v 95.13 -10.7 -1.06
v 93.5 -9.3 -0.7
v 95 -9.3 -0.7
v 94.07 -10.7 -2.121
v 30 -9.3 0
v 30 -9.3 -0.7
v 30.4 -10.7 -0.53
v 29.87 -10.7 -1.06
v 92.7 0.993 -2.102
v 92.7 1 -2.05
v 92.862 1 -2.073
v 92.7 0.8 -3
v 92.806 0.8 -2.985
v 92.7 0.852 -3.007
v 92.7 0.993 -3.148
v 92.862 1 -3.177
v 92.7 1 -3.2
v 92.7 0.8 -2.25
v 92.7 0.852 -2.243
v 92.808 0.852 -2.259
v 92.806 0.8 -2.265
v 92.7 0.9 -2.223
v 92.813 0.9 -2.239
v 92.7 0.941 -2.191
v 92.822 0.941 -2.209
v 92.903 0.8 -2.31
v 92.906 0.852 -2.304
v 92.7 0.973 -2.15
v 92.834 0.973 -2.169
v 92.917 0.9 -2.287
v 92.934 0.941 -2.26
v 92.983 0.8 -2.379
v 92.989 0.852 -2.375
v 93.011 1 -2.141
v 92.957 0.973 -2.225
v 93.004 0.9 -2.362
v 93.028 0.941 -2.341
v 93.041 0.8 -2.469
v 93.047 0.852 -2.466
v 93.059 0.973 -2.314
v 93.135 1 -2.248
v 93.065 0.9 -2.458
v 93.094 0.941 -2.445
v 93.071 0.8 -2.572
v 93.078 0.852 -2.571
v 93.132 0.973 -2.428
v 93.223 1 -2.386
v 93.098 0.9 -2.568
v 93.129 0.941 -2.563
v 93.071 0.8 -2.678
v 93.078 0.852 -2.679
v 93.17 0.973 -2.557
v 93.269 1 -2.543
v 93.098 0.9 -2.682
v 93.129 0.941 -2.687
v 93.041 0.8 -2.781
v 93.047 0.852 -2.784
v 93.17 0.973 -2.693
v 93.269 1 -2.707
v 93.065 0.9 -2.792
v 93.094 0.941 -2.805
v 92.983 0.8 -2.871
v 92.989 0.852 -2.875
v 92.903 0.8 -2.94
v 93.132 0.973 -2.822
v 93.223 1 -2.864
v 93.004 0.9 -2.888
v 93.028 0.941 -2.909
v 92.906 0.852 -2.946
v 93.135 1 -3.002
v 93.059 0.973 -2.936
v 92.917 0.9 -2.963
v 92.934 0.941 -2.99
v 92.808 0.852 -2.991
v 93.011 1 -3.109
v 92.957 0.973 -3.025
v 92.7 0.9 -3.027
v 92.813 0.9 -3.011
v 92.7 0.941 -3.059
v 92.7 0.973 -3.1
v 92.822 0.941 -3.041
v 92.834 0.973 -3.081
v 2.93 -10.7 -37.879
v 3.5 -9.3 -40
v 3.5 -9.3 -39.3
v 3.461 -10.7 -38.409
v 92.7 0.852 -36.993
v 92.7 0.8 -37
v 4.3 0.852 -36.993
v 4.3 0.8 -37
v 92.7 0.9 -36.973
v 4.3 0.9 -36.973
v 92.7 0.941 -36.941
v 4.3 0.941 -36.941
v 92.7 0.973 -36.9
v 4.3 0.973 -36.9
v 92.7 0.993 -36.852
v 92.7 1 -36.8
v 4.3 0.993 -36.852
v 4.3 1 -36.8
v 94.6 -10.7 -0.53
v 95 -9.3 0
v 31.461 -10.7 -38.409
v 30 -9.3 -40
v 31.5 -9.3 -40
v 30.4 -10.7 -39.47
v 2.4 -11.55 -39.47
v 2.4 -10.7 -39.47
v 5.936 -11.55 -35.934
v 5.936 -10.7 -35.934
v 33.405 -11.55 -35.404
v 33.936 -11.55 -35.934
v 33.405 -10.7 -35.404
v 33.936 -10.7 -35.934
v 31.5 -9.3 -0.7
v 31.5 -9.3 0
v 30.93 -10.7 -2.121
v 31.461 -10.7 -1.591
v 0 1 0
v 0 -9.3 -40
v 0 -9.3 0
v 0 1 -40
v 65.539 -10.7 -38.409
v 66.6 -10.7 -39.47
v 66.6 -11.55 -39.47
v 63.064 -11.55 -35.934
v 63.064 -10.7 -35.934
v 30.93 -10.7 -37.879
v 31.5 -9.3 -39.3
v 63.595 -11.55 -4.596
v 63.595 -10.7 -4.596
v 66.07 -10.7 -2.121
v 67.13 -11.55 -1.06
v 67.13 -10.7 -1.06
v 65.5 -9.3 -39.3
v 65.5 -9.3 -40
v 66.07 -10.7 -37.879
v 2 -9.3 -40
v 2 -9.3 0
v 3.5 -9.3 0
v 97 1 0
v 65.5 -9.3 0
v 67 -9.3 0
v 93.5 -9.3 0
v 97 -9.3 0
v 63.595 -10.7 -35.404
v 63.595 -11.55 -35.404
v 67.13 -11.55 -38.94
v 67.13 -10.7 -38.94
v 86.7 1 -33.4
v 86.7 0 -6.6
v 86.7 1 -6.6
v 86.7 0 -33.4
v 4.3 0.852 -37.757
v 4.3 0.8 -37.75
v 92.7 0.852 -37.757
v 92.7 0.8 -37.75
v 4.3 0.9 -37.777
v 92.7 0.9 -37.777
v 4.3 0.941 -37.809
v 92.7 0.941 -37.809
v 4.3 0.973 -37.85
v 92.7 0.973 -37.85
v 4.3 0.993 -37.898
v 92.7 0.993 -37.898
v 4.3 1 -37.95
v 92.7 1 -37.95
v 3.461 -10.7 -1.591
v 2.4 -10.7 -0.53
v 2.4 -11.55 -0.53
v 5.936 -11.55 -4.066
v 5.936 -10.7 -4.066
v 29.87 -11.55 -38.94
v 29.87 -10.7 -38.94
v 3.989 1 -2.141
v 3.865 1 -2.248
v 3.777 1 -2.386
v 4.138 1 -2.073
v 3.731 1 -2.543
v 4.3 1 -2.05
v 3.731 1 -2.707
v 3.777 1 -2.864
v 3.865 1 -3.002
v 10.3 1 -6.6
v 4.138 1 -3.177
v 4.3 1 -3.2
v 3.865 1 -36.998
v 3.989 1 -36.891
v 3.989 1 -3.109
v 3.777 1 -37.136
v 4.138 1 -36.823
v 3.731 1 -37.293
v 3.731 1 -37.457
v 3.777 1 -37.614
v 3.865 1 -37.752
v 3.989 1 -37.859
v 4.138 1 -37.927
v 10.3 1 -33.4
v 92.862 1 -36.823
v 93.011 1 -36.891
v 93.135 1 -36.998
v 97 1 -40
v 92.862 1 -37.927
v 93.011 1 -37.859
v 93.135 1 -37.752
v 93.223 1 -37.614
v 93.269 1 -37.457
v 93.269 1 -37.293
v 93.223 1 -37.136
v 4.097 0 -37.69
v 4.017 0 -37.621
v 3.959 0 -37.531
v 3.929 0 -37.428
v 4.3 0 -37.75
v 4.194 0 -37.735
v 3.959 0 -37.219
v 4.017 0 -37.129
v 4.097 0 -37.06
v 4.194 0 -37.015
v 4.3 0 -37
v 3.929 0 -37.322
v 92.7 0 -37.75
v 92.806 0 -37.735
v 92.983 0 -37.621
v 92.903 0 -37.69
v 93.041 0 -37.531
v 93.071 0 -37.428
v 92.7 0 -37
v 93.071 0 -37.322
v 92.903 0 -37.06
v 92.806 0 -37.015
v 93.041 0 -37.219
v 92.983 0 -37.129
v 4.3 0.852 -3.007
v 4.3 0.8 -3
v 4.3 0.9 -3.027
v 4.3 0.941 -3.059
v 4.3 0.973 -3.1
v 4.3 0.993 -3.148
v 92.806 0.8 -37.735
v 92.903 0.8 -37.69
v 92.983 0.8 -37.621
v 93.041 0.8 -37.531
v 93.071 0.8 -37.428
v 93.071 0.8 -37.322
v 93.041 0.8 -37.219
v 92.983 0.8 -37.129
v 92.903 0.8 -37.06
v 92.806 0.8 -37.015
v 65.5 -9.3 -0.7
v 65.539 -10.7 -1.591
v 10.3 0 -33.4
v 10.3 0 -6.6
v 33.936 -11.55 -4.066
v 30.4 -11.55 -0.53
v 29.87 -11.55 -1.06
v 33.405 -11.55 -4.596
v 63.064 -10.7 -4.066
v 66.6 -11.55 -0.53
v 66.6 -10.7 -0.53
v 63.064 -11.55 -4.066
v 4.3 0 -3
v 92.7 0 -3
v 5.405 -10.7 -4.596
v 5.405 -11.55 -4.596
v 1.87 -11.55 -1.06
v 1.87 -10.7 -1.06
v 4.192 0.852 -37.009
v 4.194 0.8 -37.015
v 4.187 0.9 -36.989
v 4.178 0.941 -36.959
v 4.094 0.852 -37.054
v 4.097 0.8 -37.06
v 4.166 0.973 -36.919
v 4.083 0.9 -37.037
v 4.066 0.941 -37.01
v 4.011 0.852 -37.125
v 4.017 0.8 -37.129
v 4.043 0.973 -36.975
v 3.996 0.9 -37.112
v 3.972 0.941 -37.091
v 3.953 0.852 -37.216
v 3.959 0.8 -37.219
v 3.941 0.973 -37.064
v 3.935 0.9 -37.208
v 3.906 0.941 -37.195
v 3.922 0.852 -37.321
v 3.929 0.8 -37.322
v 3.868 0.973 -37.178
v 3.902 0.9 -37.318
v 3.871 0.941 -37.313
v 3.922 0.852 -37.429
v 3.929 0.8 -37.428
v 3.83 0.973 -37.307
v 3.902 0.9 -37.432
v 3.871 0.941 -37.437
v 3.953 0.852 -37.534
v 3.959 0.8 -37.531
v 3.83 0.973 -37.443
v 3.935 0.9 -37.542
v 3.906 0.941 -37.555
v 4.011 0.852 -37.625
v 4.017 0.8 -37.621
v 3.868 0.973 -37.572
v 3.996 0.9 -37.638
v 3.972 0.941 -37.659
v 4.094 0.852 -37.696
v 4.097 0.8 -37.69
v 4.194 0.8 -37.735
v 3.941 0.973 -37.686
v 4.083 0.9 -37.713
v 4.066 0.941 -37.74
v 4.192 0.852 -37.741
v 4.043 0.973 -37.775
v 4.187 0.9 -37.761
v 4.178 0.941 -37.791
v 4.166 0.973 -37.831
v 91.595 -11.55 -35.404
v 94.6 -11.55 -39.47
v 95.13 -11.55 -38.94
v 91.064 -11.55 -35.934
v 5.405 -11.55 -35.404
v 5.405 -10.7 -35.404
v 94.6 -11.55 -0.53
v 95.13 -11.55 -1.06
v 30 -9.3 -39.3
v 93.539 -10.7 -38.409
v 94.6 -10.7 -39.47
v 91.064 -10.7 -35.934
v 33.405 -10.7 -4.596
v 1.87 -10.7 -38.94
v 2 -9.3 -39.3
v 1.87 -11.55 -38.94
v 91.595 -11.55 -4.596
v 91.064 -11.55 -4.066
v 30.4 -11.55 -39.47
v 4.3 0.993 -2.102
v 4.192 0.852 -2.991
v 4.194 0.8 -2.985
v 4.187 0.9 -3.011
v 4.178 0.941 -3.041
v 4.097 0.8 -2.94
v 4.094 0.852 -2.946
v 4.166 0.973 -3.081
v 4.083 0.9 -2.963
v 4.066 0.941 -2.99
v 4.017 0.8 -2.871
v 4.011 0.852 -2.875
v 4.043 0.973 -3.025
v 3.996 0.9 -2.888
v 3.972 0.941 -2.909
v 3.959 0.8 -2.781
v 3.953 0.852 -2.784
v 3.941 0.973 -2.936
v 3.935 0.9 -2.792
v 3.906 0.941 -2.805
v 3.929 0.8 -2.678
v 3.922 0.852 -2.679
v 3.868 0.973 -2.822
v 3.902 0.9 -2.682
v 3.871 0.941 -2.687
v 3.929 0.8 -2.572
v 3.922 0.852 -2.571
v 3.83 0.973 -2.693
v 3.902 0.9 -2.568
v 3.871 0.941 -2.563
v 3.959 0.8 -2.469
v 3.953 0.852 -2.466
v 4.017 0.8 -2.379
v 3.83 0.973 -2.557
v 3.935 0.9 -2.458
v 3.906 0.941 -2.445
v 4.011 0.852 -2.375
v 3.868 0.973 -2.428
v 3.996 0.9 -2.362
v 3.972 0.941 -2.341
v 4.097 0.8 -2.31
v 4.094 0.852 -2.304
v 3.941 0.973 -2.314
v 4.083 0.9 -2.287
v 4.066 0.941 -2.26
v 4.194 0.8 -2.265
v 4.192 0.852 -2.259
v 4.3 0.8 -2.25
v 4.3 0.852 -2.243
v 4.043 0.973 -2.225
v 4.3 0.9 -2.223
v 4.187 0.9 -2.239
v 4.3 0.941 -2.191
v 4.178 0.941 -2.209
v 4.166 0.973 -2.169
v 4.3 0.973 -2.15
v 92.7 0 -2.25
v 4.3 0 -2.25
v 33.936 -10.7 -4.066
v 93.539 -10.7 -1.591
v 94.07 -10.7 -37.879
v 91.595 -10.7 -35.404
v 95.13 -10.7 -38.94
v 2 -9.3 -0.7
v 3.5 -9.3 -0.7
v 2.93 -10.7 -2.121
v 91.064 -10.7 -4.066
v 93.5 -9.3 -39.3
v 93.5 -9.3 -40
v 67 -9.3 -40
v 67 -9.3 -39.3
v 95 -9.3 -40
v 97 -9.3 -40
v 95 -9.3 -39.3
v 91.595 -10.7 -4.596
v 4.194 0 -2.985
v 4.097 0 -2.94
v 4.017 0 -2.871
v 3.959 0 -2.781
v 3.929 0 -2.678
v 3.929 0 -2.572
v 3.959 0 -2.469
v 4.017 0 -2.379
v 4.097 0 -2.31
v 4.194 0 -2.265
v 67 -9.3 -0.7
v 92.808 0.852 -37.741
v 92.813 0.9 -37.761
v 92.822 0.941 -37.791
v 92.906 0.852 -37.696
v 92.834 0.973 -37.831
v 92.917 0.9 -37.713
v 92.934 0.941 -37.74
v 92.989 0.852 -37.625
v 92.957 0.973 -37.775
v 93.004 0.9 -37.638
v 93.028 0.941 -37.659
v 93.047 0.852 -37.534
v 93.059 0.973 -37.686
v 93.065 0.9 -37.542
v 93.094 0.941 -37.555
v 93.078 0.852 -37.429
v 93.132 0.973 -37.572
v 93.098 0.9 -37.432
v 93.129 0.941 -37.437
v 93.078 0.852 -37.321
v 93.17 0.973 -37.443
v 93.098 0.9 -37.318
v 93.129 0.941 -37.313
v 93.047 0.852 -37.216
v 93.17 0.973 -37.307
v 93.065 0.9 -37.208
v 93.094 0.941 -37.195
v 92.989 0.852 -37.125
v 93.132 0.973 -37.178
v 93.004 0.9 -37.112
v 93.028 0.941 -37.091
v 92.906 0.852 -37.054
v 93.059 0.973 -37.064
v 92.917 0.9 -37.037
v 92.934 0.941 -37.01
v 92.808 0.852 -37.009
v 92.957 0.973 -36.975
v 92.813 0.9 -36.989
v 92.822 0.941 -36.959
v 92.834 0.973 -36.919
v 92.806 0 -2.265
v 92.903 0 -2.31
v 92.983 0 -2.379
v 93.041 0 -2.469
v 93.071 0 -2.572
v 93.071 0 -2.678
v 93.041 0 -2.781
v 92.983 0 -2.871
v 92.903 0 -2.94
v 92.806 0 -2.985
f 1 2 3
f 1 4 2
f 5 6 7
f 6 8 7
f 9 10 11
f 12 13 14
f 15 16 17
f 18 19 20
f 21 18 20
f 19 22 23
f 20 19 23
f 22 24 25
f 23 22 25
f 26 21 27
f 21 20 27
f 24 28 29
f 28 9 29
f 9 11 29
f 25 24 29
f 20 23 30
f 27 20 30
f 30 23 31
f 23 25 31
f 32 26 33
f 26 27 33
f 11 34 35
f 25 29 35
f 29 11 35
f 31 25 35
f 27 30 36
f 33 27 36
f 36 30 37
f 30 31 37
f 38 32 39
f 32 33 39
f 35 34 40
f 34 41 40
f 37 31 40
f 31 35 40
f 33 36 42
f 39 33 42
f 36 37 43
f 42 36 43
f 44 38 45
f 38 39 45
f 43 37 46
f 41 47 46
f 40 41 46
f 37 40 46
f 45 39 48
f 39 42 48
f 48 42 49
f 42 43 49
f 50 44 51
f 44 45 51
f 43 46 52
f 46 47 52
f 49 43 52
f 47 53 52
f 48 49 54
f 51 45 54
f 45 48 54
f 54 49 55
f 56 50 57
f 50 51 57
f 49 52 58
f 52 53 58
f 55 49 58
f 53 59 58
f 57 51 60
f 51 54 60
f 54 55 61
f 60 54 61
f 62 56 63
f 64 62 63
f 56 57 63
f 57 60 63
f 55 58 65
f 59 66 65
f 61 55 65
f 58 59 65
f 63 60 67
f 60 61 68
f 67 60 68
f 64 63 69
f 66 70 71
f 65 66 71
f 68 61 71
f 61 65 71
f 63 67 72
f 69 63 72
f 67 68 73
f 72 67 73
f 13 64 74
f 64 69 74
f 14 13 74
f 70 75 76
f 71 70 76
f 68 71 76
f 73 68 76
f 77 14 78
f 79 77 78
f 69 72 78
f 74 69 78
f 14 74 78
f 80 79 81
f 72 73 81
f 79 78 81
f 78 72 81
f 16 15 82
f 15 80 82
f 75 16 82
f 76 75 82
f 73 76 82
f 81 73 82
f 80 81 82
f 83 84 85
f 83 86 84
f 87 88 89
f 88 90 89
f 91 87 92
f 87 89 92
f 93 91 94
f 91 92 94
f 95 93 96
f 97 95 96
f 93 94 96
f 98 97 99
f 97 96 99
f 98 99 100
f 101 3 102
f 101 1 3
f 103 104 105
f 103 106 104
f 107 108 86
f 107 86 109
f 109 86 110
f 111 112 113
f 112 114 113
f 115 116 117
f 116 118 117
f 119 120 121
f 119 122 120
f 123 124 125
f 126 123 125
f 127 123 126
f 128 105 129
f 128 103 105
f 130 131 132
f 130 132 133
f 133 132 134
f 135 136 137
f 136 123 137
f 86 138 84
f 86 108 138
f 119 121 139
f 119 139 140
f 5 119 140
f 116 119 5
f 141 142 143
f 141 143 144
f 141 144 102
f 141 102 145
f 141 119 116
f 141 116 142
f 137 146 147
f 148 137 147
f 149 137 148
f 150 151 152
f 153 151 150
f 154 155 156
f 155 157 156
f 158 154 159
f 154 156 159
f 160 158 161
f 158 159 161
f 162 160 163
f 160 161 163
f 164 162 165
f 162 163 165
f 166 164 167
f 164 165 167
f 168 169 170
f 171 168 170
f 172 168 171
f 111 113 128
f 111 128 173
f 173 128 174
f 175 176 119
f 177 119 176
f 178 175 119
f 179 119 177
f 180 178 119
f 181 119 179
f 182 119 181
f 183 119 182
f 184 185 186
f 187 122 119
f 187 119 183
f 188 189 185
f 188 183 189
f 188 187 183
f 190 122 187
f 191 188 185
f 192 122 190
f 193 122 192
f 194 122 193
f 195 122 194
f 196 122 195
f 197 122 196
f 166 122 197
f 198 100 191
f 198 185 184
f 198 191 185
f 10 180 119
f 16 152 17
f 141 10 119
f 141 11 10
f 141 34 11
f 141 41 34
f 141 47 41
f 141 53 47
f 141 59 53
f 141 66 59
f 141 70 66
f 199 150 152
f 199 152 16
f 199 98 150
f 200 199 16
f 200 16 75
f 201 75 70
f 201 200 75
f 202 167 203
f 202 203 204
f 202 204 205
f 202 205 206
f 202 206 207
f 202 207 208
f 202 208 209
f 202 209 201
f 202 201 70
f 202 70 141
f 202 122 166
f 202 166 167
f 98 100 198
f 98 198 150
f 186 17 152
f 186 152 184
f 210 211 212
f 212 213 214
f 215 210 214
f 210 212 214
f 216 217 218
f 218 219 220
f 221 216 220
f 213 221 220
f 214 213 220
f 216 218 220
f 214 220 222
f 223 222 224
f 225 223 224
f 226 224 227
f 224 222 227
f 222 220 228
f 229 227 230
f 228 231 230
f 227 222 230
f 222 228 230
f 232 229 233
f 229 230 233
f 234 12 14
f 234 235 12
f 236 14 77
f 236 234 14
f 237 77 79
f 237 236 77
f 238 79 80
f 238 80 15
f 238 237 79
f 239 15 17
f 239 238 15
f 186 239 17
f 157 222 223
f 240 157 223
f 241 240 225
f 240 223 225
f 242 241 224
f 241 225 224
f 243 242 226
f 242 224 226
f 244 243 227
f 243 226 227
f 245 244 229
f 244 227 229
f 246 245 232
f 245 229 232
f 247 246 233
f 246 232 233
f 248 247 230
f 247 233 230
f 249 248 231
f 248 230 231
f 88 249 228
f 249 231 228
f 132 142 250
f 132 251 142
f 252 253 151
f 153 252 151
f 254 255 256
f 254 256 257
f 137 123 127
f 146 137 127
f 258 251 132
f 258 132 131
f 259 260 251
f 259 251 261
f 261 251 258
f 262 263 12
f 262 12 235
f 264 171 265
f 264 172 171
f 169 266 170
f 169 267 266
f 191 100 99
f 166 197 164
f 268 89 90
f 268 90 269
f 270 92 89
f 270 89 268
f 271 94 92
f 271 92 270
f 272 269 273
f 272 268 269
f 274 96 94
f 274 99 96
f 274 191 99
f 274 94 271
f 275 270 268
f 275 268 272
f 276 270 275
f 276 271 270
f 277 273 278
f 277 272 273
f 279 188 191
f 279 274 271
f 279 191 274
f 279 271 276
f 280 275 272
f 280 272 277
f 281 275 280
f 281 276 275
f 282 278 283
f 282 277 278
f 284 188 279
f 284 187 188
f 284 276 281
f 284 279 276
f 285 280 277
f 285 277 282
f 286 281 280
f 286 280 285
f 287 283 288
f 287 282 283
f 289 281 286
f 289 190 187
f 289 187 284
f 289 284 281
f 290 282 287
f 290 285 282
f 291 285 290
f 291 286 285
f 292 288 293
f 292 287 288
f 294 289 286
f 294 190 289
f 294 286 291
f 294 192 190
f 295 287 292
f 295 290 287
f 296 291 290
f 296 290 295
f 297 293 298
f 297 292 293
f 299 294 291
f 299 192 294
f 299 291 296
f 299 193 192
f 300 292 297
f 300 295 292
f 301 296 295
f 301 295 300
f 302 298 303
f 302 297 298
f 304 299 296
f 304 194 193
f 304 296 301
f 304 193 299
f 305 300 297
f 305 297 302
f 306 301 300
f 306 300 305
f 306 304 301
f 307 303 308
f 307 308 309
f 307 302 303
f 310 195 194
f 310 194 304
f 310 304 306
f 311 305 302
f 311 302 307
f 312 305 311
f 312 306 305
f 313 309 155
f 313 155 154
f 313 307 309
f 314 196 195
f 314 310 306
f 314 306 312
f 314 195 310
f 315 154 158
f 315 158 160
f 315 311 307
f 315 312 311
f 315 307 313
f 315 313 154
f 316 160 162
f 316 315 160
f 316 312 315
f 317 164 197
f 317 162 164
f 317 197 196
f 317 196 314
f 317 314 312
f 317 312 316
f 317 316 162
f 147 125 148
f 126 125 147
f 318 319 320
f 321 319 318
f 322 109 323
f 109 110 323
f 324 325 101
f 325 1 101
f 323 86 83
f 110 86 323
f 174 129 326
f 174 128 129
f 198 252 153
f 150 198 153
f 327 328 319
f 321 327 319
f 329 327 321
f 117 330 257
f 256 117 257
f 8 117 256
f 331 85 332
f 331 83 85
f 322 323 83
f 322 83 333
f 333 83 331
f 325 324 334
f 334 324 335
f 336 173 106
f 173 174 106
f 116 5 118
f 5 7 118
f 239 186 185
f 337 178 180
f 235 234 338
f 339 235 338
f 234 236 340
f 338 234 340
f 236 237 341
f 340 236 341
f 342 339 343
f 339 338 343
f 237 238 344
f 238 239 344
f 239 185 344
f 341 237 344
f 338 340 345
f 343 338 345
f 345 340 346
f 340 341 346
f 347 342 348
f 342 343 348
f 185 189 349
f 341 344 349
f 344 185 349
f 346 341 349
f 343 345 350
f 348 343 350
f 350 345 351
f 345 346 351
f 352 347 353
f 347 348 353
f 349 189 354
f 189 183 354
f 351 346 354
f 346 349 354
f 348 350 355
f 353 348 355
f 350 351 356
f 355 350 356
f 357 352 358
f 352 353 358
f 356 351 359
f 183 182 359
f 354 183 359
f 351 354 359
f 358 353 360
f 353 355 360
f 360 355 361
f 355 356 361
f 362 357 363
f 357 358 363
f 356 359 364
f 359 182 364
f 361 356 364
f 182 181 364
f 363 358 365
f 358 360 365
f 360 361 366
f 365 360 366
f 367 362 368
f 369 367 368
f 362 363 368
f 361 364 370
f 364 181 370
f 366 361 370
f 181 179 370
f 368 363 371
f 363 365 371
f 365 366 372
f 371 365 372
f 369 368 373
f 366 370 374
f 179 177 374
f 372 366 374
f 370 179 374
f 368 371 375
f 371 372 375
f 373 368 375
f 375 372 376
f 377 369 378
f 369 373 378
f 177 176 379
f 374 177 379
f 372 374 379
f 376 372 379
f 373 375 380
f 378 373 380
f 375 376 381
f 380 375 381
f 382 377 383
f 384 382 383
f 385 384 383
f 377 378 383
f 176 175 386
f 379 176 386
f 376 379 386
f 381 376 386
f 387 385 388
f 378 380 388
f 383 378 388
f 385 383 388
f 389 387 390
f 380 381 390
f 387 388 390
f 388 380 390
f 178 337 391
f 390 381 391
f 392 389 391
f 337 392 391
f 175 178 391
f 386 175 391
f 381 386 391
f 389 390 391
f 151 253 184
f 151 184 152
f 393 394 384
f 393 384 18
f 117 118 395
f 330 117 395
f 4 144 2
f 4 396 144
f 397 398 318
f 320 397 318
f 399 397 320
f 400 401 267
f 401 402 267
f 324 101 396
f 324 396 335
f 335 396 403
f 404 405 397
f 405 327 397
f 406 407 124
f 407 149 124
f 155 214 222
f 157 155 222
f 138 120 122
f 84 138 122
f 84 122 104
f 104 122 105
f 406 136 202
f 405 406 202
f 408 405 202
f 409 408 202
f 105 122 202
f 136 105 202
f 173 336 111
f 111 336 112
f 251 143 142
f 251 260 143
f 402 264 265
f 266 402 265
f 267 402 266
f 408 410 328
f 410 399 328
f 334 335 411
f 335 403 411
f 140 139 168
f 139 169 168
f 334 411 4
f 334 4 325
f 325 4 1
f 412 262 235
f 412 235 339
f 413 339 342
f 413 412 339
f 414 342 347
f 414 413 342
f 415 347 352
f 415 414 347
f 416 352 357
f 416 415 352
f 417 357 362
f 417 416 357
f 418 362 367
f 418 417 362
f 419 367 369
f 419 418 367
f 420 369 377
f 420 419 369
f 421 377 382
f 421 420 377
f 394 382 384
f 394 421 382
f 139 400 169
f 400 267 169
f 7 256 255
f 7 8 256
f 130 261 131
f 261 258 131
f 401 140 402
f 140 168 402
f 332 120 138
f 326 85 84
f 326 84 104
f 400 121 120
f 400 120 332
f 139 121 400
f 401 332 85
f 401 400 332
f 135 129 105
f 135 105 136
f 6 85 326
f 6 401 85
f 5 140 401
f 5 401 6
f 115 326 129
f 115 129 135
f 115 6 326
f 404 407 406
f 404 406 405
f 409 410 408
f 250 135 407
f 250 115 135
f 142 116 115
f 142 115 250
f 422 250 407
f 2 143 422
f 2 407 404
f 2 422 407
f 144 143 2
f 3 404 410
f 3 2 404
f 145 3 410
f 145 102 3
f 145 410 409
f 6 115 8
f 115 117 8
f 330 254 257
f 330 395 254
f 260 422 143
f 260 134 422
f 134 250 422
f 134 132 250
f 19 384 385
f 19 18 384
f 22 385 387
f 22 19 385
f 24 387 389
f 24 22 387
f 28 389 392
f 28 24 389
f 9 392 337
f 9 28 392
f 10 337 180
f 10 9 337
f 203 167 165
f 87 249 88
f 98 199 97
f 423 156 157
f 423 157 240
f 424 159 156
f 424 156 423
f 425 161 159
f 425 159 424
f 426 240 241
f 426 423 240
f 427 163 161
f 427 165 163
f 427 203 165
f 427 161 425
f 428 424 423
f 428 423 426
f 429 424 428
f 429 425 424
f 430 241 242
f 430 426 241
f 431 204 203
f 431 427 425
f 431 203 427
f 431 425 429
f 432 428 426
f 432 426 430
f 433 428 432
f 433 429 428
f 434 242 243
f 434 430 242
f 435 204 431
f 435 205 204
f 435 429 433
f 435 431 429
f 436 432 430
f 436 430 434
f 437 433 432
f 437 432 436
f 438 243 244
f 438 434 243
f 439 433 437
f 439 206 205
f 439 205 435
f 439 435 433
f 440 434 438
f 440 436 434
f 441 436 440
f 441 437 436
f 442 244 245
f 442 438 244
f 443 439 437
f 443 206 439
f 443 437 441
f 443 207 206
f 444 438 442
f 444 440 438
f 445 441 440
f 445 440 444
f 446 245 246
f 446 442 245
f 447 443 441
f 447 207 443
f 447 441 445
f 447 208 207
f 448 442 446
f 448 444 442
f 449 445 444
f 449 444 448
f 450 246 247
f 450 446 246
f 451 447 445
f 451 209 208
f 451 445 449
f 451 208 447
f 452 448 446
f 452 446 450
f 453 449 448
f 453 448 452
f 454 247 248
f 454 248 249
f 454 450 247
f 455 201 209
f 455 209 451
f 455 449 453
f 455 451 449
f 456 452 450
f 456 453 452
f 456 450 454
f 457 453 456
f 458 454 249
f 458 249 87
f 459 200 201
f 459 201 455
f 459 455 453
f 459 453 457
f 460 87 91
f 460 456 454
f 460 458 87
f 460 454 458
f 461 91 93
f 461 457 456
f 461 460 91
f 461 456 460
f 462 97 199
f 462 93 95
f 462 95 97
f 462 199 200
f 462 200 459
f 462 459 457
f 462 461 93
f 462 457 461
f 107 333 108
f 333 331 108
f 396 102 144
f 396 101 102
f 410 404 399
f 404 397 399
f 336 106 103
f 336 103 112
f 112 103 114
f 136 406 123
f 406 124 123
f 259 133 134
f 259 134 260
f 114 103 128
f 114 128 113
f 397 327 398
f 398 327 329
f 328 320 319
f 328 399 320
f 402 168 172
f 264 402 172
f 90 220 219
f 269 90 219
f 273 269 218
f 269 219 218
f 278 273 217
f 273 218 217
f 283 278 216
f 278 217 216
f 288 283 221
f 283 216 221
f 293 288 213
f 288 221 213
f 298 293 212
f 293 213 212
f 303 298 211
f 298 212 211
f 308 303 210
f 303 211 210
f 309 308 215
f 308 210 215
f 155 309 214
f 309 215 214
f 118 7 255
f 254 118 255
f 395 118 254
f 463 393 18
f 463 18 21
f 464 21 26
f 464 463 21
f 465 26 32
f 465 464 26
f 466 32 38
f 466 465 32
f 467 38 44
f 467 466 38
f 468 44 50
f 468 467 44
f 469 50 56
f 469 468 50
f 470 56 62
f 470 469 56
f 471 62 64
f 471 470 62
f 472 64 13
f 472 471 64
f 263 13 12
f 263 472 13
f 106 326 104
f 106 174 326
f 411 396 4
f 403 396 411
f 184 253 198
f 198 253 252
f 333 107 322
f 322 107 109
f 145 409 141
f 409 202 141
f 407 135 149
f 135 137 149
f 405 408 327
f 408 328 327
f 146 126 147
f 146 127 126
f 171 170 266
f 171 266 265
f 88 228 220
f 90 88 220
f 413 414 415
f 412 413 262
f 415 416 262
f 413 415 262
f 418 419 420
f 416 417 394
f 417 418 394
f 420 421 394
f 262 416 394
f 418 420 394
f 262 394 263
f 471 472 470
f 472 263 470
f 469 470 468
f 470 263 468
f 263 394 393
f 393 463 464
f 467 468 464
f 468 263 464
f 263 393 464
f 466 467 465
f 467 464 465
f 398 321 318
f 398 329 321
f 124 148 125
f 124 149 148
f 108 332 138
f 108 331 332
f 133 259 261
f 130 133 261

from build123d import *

# Parameters (mm, degrees)
SKETCH1_W           = 97
SKETCH1_H           = 40
SKETCH1_W_2         = 76.4
SKETCH1_H_2         = 26.8
BOSS_EXTRUDE2_DEPTH = 1
FILLET1_R           = 0.2
SKETCH2_W           = 97
SKETCH2_H           = 40
BOSS_EXTRUDE3_DEPTH = 9.3
LPATTERN1_COUNT     = 2
LPATTERN1_PITCH     = 28


# Read off the part's stored shape, not the designer's step: Mirror1, Mirror2
with BuildPart() as part:
    # Sketch1 → Boss-Extrude2 (new body)
    with BuildSketch(Plane(origin=(0, 0, 0), x_dir=(1, 0, 0), z_dir=(0, 1, 0))):
        with Locations((48.5, 20)):
            Rectangle(SKETCH1_W, SKETCH1_H)
        with Locations((48.5, 20)):
            Rectangle(SKETCH1_W_2, SKETCH1_H_2, mode=Mode.SUBTRACT)
        with BuildLine():
            Line((4.3, 37.75), (92.7, 37.75))
            ThreePointArc((92.7, 37.75), (93.075, 37.375), (92.7, 37))
            Line((92.7, 37), (4.3, 37))
            ThreePointArc((4.3, 37), (3.925, 37.375), (4.3, 37.75))
        make_face(mode=Mode.SUBTRACT)
        with BuildLine():
            Line((4.3, 2.25), (92.7, 2.25))
            ThreePointArc((92.7, 2.25), (93.075, 2.625), (92.7, 3))
            Line((92.7, 3), (4.3, 3))
            ThreePointArc((4.3, 3), (3.925, 2.625), (4.3, 2.25))
        make_face(mode=Mode.SUBTRACT)
    extrude(amount=BOSS_EXTRUDE2_DEPTH)

    # Fillet1
    fillet1_edges = [part.edges().sort_by_distance(p)[0] for p in [
        (3.925, 1, -37.375),
        (48.5, 1, -37),
        (93.075, 1, -37.375),
        (48.5, 1, -37.75),
        (3.925, 1, -2.625),
        (48.5, 1, -2.25),
        (93.075, 1, -2.625),
        (48.5, 1, -3),
    ]]
    fillet(fillet1_edges, radius=FILLET1_R)

    # Sketch2 → Boss-Extrude3 (add)
    with BuildSketch(Plane.XZ):
        with Locations((48.5, -20)):
            Rectangle(SKETCH2_W, SKETCH2_H)
    extrude(amount=BOSS_EXTRUDE3_DEPTH)

    # Sketch3 → Loft1 section 0
    with BuildSketch(Plane.XZ.offset(9.3)):
        with BuildLine():
            Line((2, 0), (3.5, 0))
            Line((3.5, 0), (3.5, -0.7))
            Line((3.5, -0.7), (2, -0.7))
            Line((2, -0.7), (2, 0))
        make_face()
    # Sketch5 → Loft1 section 1
    with BuildSketch(Plane(origin=(0, -10.7, 0), x_dir=(-1, 0, 0), z_dir=(0, -1, 0))):
        with BuildLine():
            Line((-2.4, 0.530034721), (-3.460660172, 1.590694893))
            Line((-3.460660172, 1.590694893), (-2.930330086, 2.121024979))
            Line((-2.930330086, 2.121024979), (-1.869669914, 1.060364807))
            Line((-1.869669914, 1.060364807), (-2.4, 0.530034721))
        make_face()
    loft1 = loft()

    # Sketch4 → Loft2 section 0
    with BuildSketch(Plane(origin=(0, -11.55, 0), x_dir=(-1, 0, 0), z_dir=(0, -1, 0))):
        with BuildLine():
            Line((-2.4, 0.530034721), (-5.935533906, 4.065568627))
            Line((-5.935533906, 4.065568627), (-5.40520382, 4.595898713))
            Line((-5.40520382, 4.595898713), (-1.869669914, 1.060364807))
            Line((-1.869669914, 1.060364807), (-2.4, 0.530034721))
        make_face()
    # Sketch6 → Loft2 section 1
    with BuildSketch(Plane(origin=(0, -10.7, 0), x_dir=(-1, 0, 0), z_dir=(0, -1, 0))):
        with BuildLine():
            Line((-5.935533906, 4.065568627), (-5.40520382, 4.595898713))
            Line((-5.40520382, 4.595898713), (-1.869669914, 1.060364807))
            Line((-1.869669914, 1.060364807), (-2.4, 0.530034721))
            Line((-2.4, 0.530034721), (-5.935533906, 4.065568627))
        make_face()
    loft2 = loft()

    # LPattern1: Loft1, Loft2 ×2
    with Locations(*[(i * LPATTERN1_PITCH, 0, 0) for i in range(1, LPATTERN1_COUNT)]):
        add(loft1)
        add(loft2)

    # Mirror1: part across plane


with BuildPart() as part_1:
    add(part.part)
    add(part.part.mirror(Plane(origin=(48.5, 0, 0), x_dir=(0, 0, 1), z_dir=(1, 0, 0))))

    # Mirror2: part across plane


with BuildPart() as part_2:
    add(part_1.part)
    add(part_1.part.mirror(Plane.XY.offset(-20)))


solid = part_2.part
